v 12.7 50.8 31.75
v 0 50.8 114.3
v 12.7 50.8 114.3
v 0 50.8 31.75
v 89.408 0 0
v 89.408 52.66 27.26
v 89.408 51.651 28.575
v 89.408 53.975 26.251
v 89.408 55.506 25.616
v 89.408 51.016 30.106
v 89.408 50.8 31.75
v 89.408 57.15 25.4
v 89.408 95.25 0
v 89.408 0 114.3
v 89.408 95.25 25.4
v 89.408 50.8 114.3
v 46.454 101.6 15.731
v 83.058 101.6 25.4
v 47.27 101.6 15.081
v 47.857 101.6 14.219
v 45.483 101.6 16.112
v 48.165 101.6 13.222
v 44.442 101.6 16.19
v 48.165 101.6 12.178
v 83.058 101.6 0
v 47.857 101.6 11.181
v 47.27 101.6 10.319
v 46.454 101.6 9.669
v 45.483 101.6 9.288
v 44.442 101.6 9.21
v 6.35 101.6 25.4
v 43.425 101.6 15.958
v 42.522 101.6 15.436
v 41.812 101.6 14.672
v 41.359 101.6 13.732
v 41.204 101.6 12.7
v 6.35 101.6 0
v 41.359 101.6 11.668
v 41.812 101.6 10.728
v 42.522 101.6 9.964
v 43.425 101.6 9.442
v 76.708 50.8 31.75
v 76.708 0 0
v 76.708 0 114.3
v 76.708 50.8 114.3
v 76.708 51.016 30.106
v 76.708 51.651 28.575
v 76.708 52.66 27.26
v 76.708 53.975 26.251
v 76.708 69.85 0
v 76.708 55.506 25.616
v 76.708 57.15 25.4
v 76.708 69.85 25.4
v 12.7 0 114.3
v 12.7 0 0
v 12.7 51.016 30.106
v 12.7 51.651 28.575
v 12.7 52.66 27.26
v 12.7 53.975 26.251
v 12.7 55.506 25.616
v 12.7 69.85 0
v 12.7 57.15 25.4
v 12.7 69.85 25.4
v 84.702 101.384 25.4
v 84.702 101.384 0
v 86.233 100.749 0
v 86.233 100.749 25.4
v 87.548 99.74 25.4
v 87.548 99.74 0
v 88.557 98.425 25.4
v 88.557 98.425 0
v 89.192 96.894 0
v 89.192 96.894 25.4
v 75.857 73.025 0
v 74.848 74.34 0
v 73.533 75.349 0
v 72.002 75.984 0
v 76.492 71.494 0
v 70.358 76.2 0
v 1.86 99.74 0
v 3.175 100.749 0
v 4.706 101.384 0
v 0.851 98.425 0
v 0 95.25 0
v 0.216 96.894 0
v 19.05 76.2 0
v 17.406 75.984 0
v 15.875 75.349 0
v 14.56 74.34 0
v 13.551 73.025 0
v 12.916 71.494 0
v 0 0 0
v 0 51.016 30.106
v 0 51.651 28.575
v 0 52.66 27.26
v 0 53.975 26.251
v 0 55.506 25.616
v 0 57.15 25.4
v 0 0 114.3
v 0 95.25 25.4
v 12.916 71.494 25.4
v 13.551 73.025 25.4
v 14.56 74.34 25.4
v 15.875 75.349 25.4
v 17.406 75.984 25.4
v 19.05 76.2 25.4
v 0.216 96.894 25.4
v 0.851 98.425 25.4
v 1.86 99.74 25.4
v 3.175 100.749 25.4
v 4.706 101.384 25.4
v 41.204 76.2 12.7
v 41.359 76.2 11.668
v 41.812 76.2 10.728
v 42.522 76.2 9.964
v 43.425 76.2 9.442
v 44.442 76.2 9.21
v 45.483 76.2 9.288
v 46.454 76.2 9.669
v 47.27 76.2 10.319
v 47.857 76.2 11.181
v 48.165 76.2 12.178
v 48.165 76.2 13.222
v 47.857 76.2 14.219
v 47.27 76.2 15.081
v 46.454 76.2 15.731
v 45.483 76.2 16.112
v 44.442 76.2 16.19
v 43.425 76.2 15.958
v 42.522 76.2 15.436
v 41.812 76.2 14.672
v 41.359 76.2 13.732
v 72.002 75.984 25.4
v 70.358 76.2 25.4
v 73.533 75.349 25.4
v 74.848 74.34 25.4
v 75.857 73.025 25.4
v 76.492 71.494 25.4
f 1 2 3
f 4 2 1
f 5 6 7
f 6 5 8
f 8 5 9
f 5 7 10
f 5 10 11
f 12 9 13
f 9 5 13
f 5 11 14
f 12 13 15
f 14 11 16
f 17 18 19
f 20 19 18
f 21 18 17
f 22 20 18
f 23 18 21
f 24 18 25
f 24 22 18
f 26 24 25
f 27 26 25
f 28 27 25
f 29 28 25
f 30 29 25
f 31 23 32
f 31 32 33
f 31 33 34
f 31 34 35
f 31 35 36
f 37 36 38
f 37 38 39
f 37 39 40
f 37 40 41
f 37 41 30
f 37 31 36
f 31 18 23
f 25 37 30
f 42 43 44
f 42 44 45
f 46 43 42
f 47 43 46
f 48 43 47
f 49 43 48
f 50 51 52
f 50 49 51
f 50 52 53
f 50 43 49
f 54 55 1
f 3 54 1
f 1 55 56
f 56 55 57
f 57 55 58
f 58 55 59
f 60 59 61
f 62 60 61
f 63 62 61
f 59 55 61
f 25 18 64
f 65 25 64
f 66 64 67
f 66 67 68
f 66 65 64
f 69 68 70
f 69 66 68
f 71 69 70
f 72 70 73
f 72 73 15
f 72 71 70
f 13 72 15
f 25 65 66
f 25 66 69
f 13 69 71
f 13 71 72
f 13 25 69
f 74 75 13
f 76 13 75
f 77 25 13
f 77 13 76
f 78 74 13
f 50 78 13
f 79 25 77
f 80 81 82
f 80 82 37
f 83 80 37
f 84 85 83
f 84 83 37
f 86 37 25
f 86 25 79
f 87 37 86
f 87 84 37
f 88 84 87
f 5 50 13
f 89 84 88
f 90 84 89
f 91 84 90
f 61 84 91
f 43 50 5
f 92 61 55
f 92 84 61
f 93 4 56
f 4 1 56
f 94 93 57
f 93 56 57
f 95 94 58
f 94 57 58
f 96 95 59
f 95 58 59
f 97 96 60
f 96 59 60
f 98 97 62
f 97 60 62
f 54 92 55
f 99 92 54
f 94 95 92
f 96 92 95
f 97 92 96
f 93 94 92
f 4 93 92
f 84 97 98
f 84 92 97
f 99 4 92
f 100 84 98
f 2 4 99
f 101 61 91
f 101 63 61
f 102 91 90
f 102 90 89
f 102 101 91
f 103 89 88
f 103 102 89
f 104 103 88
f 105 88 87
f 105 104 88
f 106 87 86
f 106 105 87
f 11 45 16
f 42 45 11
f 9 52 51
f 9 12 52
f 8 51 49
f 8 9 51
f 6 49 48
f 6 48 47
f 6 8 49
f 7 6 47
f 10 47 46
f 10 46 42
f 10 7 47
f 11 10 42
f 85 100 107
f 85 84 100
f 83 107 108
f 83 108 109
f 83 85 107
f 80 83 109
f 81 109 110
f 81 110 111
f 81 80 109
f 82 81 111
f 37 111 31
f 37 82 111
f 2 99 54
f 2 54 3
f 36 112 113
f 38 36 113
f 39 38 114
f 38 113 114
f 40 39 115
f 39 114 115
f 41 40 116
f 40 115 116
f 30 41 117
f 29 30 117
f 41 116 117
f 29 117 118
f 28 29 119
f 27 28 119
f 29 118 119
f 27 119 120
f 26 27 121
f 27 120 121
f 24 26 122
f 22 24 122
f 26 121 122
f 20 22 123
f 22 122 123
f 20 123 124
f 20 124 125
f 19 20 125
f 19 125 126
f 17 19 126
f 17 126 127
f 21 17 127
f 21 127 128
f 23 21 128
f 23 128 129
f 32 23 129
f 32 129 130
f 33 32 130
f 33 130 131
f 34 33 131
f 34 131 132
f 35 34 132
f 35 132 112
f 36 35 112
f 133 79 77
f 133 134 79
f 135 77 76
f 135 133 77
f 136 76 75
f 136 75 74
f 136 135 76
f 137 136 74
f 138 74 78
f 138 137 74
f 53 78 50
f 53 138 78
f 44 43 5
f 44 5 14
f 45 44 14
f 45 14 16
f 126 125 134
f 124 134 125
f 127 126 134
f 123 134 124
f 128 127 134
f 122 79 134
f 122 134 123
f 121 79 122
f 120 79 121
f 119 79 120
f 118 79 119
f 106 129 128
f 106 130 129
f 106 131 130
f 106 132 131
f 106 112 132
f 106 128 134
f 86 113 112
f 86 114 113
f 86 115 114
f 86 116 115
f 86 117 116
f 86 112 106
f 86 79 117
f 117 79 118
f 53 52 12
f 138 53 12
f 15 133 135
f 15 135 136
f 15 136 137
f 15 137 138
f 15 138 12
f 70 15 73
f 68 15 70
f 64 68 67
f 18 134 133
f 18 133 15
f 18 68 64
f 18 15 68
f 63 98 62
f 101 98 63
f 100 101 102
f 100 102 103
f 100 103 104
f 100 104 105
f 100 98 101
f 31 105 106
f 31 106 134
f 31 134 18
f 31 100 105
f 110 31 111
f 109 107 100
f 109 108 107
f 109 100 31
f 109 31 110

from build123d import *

# Parameters (mm, degrees)
BOSS_EXTRUDE1_DEPTH   = 89.408
SKETCH2_W             = 64.008
SKETCH2_H             = 76.2
CUT_EXTRUDE1_DEPTH    = 178.146381459
F_7_0MM_DOWEL_HOLE1_D = 7
FILLET1_R             = 6.35


with BuildPart() as part:
    # Sketch1 → Boss-Extrude1 (new body)
    with BuildSketch(Plane(origin=(0, 0, 0), x_dir=(0, 0, -1), z_dir=(1, 0, 0))):
        Polygon((0, 0), (-114.3, 0), (-114.3, 50.8), (-25.4, 50.8), (-25.4, 101.6), (0, 101.6), align=None)
    extrude(amount=BOSS_EXTRUDE1_DEPTH)

    # Sketch2 → Cut-Extrude1 (cut, through all)
    with BuildSketch(Plane(origin=(0, 0, 0), x_dir=(-1, 0, 0), z_dir=(0, 0, -1))):
        with Locations((-44.704, 38.1)):
            Rectangle(SKETCH2_W, SKETCH2_H)
    extrude(amount=-CUT_EXTRUDE1_DEPTH, mode=Mode.SUBTRACT)

    # Ø7.0mm Dowel Hole1 (through all)
    with Locations(Plane(origin=(0, 101.6, 0), x_dir=(1, 0, 0), z_dir=(0, 1, 0))):
        with Locations((44.704, -12.7)):
            Hole(F_7_0MM_DOWEL_HOLE1_D / 2)

    # Fillet1
    fillet1_edges = [part.edges().sort_by_distance(p)[0] for p in [
        (83.058, 50.8, 25.4),
        (6.35, 50.8, 25.4),
        (76.708, 76.2, 12.7),
        (12.7, 76.2, 12.7),
        (0, 101.6, 12.7),
        (89.408, 101.6, 12.7),
    ]]
    fillet(fillet1_edges, radius=FILLET1_R)


solid = part.part
